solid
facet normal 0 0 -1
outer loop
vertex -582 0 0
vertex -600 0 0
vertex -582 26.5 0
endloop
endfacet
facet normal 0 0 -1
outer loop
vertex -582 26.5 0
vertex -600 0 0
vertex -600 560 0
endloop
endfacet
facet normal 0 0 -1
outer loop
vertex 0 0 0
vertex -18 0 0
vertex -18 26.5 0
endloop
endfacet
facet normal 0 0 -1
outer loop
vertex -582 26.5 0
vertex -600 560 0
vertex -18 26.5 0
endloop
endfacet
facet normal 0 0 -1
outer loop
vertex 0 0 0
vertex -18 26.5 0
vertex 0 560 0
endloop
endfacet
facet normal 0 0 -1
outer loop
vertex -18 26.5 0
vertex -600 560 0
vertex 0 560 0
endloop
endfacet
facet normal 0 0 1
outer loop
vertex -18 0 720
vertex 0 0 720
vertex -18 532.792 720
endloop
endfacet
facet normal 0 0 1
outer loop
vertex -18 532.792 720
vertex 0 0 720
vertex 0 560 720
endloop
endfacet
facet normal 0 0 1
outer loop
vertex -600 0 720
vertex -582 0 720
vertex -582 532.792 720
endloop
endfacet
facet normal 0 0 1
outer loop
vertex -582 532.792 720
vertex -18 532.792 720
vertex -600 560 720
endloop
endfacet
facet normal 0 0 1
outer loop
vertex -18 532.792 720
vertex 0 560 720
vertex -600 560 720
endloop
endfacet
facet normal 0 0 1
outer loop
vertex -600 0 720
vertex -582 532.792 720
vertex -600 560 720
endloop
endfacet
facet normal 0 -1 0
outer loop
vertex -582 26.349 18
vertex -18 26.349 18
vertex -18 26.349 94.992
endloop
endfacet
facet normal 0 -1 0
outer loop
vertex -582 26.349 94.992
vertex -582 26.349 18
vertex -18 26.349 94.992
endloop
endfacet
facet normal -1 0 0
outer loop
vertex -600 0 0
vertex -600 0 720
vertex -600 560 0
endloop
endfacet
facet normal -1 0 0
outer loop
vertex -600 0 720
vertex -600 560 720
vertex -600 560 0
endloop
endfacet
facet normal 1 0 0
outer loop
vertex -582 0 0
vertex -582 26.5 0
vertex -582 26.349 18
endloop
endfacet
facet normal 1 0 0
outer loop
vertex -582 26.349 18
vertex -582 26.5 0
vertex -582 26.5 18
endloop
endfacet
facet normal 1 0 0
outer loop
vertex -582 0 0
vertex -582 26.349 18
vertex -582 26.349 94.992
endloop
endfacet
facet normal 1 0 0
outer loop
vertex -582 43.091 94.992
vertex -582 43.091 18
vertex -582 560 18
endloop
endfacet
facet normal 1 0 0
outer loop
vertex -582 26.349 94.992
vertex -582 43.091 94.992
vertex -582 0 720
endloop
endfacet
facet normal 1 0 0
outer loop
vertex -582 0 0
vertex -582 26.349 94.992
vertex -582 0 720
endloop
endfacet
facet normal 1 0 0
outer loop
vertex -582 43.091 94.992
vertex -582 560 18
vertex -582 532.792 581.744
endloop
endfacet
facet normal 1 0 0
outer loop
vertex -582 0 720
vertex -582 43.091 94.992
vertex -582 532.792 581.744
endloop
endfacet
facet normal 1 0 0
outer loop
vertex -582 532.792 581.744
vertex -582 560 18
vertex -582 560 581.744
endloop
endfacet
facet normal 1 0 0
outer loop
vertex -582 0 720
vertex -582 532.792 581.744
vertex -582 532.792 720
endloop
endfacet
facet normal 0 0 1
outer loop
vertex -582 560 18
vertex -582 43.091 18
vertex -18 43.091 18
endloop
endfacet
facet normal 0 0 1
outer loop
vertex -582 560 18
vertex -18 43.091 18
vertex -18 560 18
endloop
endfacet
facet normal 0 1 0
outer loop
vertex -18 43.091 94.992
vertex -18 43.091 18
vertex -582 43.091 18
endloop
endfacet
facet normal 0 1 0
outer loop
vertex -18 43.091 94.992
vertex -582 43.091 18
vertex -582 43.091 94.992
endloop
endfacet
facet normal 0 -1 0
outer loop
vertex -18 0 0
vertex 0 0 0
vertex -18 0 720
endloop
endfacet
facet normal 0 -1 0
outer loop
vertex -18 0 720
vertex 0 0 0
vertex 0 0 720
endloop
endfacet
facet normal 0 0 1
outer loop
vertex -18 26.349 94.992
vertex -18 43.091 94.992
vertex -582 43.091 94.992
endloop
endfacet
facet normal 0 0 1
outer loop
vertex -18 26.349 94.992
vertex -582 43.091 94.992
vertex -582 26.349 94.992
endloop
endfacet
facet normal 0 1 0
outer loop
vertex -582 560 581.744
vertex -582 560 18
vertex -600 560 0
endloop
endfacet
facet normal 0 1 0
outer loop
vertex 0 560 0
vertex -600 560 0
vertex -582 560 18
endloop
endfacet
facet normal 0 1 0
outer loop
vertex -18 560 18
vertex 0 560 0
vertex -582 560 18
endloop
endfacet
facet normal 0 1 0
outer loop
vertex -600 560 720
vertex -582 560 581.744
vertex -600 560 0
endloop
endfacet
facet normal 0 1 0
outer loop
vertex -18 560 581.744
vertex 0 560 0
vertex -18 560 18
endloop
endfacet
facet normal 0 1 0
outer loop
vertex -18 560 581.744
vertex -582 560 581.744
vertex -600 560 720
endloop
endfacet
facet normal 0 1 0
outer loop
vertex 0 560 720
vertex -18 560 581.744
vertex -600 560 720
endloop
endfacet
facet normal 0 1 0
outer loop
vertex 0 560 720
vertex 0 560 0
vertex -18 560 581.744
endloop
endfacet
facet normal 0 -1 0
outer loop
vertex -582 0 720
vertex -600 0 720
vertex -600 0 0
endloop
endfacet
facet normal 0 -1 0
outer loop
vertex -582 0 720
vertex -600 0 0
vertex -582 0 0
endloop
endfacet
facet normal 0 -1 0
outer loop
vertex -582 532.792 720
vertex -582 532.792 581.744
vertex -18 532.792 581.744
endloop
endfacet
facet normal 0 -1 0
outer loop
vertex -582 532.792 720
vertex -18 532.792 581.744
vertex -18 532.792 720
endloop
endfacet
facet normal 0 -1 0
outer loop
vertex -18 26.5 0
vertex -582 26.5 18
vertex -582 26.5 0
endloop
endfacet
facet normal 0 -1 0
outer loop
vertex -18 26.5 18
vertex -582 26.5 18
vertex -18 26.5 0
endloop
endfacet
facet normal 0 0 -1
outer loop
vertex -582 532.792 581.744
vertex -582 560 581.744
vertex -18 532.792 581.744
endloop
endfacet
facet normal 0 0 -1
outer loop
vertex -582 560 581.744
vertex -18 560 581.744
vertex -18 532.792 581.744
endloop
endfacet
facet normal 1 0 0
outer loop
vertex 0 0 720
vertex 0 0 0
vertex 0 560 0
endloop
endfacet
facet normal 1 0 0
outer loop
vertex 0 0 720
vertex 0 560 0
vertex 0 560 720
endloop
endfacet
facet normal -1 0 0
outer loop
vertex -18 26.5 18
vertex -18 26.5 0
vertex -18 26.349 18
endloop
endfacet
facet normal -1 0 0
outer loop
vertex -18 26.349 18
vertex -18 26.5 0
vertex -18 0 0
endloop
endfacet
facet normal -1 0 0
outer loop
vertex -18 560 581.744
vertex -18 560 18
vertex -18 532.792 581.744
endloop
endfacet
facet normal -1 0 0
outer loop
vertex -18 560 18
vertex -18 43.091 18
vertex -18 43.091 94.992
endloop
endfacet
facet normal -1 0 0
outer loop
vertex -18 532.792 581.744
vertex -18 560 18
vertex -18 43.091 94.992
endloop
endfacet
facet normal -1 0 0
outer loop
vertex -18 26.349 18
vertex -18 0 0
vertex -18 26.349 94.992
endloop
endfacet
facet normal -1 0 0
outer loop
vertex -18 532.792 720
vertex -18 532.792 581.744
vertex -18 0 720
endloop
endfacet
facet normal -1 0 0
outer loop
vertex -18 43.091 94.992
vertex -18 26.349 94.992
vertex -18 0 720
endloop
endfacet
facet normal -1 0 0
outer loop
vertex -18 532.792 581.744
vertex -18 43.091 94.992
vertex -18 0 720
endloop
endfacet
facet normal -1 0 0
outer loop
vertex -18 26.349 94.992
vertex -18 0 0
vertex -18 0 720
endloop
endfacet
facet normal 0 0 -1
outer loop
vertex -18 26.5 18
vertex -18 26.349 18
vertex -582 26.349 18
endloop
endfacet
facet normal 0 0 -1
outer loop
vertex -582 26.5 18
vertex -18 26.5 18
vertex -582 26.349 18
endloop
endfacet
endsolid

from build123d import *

# Parameters (mm, degrees)
F0_W      = 52.5068640709
F0_H      = 40.332518518
F1_DEPTH  = 560
F2_DEPTH  = 600
F3_DEPTH  = 720
F4_T      = -18
F5_W      = 27.2077894211
F5_H      = 138.2559251785
F6_DEPTH  = 562
F7_DEPTH  = 2
F8_W      = 16.7428851128
F8_H      = 76.9920415878
F9_DEPTH  = 564
F11_DEPTH = 10
F13_DEPTH = 10
F14_DEPTH = 16.5


with BuildPart() as f1:
    # F0 (on Front) → F1 (new body)
    with BuildSketch(Plane.XZ):
        with Locations((-26.2534320354, 20.166259259)):
            Rectangle(F0_W, F0_H)
    extrude(amount=-F1_DEPTH)

    # F2 (add): a face of the model
    f2_faces = [f1.faces().sort_by_distance(p)[0] for p in [
        (0, 280, 20.166259259),
    ]]
    extrude(f2_faces, amount=-F2_DEPTH)

    # F3 (add): a face of the model
    f3_faces = [f1.faces().sort_by_distance(p)[0] for p in [
        (-300, 280, 0),
    ]]
    extrude(f3_faces, amount=-F3_DEPTH)

    # F4
    f4_openings = [f1.faces().sort_by_distance(p)[0] for p in [
        (-300, 560, 360),
        (-300, 280, 720),
        (-300, 0, 360),
    ]]
    offset(amount=F4_T, openings=f4_openings)

    # F5 (on face) → F6 (join)
    with BuildSketch(Plane(origin=(-18, 0, 0), x_dir=(0, -1, 0), z_dir=(-1, 0, 0))):
        with Locations((-546.3961052895, 650.8720374107)):
            Rectangle(F5_W, F5_H)
    extrude(amount=F6_DEPTH)

    # F7 (add): a face of the model
    f7_faces = [f1.faces().sort_by_distance(p)[0] for p in [
        (-580, 546.3961052895, 650.8720374107),
    ]]
    extrude(f7_faces, amount=F7_DEPTH)

    # F8 (on face) → F9 (join)
    with BuildSketch(Plane(origin=(-18, 0, 0), x_dir=(0, -1, 0), z_dir=(-1, 0, 0))):
        with Locations((-34.7199738026, 56.4960207939)):
            Rectangle(F8_W, F8_H)
    extrude(amount=F9_DEPTH)

    # F10 (on face) → F11 (cut)
    with BuildSketch(Plane.XZ):
        Polygon((-18, 0), (-18, 18), (-582, 18), (-582, 720), (-600, 720), (-600, 0), align=None)
    extrude(amount=-F11_DEPTH, mode=Mode.SUBTRACT)

    # F12 (on face) → F13 (join)
    with BuildSketch(Plane.XZ.offset(-10)):
        Polygon((-582, 0), (-582, 18), (-582, 720), (-600, 720), (-600, 0), align=None)
    extrude(amount=F13_DEPTH)

    # F14 (cut): a face of the model
    f14_faces = [f1.faces().sort_by_distance(p)[0] for p in [
        (-300, 10, 9),
    ]]
    extrude(f14_faces, amount=-F14_DEPTH, mode=Mode.SUBTRACT)


solid = f1.part
